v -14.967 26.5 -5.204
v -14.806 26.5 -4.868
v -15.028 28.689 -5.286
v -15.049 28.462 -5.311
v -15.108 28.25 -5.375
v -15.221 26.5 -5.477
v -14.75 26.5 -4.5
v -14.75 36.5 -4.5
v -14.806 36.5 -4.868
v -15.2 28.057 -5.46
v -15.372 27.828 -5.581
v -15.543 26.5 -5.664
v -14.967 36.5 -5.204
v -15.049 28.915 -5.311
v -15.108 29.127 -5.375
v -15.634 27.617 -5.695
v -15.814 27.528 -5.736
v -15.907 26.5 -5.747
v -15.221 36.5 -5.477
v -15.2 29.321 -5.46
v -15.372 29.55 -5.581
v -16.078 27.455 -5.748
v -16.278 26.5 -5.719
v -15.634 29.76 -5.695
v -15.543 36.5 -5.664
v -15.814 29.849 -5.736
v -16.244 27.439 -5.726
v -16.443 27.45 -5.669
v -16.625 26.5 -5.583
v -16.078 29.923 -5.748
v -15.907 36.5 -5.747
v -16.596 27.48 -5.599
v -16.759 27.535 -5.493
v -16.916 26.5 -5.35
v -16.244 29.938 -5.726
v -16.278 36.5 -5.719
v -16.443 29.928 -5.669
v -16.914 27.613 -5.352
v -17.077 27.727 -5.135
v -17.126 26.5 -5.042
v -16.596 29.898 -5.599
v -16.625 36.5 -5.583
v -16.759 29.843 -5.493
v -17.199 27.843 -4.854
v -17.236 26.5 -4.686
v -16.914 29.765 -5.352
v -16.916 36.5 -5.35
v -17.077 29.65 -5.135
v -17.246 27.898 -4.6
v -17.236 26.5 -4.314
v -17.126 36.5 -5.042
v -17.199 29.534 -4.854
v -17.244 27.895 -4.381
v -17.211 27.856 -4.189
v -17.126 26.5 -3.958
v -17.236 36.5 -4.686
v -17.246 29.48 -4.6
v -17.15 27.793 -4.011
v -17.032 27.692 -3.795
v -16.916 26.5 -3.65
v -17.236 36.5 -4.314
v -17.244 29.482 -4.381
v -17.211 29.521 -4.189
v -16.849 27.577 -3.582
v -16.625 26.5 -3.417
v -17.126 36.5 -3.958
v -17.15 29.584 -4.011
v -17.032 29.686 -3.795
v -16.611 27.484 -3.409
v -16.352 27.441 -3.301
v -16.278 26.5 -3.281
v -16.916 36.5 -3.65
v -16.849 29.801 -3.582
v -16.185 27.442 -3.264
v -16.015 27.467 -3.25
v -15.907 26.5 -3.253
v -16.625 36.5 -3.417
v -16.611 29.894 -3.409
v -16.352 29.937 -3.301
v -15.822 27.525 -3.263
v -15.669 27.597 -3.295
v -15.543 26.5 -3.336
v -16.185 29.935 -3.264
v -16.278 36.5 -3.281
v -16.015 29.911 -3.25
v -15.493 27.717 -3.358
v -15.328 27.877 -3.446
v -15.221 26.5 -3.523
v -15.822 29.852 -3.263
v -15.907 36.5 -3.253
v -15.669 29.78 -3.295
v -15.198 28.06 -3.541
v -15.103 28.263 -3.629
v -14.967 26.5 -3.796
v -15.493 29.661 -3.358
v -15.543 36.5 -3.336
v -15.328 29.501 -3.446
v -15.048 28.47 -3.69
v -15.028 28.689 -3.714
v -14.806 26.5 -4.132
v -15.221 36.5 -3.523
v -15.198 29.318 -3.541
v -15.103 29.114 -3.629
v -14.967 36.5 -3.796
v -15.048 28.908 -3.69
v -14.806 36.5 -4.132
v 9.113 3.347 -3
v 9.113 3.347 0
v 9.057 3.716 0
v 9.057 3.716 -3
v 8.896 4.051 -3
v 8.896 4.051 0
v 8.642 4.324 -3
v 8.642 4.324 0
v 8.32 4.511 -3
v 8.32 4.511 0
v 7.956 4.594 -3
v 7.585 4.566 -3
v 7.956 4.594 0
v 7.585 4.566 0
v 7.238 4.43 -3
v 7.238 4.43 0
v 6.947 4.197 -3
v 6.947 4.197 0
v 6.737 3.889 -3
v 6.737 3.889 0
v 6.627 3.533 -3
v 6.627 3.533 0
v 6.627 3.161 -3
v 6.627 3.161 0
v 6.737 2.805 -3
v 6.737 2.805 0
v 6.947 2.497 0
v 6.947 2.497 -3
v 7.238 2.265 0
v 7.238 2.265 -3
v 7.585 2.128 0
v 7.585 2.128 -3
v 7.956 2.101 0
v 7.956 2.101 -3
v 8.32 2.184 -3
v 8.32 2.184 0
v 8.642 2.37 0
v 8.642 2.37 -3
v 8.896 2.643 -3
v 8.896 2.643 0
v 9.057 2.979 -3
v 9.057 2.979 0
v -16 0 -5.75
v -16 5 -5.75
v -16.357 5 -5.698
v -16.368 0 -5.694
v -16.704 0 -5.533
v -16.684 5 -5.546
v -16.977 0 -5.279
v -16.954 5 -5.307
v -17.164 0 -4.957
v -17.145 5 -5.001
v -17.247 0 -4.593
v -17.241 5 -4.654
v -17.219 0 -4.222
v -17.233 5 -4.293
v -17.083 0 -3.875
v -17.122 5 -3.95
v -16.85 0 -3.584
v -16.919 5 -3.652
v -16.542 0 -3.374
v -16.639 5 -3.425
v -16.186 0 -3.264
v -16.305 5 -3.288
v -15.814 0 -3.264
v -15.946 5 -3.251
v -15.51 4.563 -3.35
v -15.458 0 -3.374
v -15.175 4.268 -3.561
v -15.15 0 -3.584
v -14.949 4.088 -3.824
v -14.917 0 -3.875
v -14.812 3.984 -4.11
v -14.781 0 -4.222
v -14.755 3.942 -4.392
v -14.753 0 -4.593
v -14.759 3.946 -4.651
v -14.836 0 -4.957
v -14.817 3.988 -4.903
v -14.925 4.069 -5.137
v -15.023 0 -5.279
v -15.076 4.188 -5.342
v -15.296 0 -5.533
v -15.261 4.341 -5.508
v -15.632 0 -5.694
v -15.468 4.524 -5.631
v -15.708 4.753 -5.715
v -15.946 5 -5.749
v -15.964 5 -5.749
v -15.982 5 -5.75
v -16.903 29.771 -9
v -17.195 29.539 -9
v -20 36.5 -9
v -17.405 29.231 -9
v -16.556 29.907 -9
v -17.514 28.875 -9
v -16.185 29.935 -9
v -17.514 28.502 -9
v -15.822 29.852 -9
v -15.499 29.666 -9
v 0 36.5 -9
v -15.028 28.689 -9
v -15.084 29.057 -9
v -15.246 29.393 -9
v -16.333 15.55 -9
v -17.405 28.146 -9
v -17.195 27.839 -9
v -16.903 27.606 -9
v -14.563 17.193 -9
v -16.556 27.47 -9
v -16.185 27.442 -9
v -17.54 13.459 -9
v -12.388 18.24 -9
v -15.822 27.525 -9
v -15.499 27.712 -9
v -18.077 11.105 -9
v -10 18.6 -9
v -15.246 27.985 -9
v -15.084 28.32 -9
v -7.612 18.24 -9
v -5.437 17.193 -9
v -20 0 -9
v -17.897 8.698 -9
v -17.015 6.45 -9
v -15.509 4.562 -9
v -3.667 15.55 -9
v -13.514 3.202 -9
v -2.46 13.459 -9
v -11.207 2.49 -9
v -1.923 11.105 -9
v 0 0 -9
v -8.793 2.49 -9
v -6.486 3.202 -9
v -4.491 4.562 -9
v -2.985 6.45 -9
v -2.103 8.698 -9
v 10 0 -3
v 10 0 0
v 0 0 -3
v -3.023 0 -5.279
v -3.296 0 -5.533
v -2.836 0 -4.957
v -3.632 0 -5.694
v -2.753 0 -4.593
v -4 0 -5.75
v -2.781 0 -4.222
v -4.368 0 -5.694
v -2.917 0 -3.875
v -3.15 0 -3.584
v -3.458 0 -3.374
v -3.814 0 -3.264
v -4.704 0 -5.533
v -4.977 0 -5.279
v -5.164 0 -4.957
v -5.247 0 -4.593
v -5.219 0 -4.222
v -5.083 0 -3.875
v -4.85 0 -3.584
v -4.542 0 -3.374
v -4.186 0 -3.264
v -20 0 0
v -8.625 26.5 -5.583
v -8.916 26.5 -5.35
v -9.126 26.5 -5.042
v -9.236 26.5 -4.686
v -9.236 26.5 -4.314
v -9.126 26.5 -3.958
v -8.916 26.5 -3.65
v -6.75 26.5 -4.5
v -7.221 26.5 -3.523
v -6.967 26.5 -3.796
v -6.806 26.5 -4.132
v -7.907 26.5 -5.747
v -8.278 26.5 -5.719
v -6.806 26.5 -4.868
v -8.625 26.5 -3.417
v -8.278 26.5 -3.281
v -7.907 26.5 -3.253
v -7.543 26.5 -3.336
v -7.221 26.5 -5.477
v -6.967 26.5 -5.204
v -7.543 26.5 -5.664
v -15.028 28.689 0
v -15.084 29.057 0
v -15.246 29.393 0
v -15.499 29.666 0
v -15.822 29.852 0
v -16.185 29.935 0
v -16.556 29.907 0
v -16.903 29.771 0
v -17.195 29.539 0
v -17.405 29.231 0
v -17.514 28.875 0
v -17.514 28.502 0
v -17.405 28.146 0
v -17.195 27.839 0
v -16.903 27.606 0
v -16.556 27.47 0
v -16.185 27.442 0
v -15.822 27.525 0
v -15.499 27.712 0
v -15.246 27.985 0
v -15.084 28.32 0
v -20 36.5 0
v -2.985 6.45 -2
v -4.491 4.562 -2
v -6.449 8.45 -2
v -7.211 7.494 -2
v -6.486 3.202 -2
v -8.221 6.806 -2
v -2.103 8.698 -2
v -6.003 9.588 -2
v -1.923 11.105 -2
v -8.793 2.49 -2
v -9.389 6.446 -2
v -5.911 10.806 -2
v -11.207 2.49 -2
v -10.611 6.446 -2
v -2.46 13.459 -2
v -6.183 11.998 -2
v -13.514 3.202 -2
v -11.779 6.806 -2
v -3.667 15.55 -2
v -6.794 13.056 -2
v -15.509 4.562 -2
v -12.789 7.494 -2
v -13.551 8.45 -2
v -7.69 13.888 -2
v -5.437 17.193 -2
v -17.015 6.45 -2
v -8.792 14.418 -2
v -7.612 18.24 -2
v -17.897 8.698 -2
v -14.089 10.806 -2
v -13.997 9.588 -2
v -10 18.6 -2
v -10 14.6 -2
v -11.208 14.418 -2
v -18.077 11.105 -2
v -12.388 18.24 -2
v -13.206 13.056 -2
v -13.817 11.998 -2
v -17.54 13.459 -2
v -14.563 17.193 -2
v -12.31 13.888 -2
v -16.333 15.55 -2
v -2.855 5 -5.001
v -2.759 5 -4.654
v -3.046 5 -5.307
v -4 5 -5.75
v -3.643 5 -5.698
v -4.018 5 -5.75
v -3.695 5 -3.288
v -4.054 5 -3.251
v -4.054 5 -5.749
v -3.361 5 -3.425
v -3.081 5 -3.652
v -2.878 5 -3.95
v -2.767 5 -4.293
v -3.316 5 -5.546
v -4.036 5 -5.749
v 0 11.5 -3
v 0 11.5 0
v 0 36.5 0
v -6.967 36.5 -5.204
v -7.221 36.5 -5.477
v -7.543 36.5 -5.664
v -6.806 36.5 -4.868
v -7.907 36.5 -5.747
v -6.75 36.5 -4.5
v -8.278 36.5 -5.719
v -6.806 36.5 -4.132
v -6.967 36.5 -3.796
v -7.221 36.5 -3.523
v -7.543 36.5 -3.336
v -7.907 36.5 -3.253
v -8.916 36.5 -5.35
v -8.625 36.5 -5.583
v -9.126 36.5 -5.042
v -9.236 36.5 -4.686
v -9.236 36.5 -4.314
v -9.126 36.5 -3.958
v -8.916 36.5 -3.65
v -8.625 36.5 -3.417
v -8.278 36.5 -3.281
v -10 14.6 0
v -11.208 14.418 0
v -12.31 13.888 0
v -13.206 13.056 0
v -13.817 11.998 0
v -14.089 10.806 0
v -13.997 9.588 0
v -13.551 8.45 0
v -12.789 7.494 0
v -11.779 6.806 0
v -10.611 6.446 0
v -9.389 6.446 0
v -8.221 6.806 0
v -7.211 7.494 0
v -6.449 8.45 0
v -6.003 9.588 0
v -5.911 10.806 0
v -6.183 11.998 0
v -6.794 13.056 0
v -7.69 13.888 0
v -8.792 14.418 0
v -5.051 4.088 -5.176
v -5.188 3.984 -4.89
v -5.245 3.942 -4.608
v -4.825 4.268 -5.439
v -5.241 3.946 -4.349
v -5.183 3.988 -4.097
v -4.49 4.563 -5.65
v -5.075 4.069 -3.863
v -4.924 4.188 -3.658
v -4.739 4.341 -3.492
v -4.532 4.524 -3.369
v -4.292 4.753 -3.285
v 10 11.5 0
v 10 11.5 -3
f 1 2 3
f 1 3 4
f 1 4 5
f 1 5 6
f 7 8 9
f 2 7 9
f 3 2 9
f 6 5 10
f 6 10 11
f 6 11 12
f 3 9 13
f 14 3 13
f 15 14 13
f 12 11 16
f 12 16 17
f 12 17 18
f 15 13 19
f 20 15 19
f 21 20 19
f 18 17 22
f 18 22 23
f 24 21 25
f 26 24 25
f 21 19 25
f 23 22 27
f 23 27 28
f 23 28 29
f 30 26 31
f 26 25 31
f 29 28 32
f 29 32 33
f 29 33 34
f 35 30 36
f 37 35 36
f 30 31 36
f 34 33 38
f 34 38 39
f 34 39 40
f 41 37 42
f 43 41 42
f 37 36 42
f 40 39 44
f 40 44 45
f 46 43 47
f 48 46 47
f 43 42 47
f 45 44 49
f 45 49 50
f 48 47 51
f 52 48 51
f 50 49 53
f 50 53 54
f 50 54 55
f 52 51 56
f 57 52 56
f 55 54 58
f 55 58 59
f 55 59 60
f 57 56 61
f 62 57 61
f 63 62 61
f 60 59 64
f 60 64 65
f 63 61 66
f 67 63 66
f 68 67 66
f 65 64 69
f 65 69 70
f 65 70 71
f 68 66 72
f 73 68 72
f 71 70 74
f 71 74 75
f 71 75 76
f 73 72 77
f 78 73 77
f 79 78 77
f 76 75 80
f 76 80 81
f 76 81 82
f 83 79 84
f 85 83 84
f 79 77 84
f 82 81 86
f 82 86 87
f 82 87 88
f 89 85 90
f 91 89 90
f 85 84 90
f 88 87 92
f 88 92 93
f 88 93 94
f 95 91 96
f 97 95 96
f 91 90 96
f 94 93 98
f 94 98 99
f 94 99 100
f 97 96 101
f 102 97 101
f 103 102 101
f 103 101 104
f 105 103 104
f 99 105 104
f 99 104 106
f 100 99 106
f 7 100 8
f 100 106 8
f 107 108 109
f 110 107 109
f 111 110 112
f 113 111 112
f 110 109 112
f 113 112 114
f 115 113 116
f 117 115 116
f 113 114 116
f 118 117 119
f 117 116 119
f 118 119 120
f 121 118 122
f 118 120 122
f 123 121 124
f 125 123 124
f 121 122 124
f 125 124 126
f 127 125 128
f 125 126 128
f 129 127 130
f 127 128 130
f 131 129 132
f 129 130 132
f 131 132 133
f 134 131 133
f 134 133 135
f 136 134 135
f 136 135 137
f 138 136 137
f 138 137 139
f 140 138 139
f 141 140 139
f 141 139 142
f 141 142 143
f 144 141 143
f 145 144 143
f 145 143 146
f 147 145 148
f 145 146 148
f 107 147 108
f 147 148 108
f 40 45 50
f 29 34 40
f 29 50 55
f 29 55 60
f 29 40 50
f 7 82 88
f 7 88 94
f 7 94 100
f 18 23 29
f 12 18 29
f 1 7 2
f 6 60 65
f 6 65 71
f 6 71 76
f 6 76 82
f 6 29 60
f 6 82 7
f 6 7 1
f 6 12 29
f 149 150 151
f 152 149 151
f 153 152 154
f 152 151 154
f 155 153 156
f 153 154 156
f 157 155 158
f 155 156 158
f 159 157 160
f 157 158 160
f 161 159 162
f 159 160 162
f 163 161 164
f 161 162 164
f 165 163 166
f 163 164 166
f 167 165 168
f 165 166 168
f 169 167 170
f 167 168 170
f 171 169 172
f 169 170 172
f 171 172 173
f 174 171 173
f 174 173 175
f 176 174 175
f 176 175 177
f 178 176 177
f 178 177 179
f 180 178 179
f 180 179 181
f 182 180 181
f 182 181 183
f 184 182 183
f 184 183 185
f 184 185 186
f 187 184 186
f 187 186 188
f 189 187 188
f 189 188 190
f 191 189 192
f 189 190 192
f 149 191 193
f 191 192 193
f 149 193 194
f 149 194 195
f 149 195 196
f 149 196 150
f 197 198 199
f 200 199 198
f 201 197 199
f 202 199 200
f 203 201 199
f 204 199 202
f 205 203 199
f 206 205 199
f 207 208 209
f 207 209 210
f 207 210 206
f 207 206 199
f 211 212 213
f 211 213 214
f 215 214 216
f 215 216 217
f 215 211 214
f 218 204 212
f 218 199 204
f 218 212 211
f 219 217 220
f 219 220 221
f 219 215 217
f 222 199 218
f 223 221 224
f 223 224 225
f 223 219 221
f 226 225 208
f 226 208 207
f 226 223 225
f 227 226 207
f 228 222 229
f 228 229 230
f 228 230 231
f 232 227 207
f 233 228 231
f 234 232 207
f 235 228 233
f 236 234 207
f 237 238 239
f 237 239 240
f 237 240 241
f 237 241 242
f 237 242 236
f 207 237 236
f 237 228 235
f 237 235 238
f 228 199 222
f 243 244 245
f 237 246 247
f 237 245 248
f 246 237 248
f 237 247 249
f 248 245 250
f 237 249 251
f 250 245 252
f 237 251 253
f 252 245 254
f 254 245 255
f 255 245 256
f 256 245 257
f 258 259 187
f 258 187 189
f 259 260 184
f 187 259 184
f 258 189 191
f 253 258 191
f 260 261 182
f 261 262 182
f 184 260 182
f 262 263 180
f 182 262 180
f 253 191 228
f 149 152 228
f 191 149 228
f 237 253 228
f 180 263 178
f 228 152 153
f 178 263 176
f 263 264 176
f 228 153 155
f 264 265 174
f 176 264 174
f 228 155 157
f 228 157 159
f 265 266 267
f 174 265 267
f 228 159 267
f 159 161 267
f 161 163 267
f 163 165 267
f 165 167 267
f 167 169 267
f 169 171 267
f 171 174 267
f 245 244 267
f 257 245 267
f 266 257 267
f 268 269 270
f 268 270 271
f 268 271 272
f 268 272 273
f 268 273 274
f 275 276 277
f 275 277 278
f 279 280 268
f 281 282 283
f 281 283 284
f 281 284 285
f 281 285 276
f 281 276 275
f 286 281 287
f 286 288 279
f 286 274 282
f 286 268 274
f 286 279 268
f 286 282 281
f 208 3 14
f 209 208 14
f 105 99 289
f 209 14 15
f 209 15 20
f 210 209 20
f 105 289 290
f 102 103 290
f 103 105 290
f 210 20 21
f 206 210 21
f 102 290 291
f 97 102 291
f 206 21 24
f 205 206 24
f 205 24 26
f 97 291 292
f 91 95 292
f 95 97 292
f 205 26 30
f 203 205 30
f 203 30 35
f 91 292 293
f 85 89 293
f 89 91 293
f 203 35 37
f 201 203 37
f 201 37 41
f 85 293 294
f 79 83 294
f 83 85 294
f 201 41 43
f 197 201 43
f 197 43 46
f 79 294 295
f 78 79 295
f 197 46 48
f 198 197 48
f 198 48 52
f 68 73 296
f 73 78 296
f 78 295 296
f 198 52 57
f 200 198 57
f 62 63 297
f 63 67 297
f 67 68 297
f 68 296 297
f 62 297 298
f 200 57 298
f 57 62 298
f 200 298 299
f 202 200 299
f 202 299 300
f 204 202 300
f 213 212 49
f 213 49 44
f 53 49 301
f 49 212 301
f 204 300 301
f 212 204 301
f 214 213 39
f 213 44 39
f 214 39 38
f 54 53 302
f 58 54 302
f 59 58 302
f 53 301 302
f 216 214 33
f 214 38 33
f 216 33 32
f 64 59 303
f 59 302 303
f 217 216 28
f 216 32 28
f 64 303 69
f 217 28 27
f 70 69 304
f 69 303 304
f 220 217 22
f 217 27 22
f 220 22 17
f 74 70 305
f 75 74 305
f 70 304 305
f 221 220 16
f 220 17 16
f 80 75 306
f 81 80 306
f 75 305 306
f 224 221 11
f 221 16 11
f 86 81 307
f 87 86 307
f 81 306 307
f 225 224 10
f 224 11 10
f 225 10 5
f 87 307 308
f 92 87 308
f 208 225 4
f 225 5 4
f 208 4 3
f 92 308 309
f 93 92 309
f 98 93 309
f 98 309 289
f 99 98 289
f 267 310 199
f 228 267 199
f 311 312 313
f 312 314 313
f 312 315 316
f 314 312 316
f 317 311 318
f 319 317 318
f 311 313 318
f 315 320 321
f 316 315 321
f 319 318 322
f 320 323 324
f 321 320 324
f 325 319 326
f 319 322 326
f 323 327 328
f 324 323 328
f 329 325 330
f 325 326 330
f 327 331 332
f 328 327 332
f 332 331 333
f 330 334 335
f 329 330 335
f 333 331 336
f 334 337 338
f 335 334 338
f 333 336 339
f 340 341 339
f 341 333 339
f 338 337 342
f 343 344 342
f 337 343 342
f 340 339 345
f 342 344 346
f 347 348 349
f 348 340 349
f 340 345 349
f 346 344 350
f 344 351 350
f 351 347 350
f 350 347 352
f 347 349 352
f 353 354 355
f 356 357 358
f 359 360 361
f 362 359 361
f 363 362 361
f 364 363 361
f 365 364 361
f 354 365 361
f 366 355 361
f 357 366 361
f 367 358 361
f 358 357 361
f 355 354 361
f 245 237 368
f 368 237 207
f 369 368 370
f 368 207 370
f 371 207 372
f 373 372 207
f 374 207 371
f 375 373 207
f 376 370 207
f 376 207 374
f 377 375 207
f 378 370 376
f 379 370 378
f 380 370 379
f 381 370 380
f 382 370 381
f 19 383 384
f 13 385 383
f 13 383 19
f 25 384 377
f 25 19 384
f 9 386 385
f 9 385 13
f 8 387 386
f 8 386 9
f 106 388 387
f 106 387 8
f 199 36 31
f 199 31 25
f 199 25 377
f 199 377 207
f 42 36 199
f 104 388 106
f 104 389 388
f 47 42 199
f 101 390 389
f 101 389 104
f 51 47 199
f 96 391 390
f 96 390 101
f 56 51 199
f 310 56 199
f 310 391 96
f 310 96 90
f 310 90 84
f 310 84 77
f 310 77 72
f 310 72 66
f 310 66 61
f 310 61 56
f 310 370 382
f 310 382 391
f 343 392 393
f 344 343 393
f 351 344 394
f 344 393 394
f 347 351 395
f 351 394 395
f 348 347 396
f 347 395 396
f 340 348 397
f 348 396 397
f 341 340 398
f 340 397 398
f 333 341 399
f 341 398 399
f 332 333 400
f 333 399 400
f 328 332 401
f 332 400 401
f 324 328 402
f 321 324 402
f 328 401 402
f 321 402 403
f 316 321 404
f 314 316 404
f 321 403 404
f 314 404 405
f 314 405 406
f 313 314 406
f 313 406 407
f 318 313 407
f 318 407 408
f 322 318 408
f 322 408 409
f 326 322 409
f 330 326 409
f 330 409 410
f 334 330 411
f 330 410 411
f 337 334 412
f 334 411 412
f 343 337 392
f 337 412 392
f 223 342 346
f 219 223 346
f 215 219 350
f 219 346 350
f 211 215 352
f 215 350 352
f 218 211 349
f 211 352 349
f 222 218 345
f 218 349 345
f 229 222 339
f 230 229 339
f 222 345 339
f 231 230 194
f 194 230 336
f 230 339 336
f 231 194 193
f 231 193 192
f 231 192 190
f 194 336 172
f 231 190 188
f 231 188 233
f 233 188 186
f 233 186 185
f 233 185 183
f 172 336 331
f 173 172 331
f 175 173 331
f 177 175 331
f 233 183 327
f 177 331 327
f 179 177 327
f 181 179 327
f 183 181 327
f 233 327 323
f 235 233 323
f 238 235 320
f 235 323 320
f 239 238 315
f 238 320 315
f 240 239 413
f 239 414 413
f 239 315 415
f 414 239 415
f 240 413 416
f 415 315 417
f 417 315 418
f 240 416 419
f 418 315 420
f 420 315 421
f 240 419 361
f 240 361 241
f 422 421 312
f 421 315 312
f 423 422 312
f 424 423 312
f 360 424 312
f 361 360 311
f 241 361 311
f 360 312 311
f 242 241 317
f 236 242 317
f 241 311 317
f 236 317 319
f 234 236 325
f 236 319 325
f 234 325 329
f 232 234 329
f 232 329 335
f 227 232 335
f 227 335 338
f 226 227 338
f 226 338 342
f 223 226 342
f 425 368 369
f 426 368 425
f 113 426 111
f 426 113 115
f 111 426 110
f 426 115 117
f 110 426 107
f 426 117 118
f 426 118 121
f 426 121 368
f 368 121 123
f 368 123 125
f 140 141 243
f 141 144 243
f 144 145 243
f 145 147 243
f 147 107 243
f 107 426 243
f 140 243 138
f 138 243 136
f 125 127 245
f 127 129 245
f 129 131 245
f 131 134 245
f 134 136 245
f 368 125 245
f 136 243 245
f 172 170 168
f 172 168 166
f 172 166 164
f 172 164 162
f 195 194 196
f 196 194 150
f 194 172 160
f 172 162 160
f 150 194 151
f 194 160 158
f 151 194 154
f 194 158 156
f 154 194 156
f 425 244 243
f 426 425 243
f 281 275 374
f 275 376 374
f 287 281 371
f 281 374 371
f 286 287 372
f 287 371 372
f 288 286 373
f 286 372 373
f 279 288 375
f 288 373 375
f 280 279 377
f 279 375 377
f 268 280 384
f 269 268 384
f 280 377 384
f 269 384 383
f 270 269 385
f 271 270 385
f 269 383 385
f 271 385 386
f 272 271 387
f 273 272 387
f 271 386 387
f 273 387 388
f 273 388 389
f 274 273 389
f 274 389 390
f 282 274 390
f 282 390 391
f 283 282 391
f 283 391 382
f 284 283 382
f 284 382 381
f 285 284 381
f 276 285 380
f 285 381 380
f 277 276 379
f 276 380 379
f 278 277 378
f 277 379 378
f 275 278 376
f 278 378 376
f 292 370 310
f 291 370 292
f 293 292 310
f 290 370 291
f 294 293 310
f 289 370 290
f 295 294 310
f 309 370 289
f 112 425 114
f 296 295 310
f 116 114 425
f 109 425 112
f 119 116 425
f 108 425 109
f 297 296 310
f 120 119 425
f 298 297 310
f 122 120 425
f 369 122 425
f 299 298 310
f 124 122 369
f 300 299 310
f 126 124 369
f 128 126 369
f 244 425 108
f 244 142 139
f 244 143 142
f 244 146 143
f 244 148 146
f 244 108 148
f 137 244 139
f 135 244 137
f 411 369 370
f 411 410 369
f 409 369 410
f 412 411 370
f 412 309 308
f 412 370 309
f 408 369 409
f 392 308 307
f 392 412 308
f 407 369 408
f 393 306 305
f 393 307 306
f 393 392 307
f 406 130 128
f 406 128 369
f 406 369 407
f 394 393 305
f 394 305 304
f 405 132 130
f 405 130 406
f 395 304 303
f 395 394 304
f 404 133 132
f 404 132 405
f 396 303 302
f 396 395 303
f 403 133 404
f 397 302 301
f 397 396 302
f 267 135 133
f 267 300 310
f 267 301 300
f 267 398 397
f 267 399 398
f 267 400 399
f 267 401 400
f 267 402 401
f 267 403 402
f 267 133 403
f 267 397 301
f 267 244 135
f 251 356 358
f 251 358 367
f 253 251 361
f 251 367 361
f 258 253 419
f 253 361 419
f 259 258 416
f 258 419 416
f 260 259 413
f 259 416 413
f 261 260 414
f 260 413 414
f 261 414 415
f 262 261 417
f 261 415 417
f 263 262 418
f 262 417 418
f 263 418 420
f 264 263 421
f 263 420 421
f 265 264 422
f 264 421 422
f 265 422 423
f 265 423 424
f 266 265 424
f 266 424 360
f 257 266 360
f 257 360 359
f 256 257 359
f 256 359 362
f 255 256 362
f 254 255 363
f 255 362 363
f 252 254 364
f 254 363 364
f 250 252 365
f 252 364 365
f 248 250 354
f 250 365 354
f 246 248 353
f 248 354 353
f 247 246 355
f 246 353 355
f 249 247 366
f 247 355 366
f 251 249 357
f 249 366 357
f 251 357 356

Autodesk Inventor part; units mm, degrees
ref_plane "YZ Plane" through (0, 0, 0) normal (1, 0, 0) x (0, 1, 0)
ref_plane "XZ Plane" through (0, 0, 0) normal (0, 1, 0) x (-1, 0, 0)
ref_plane "Plano de trabajo1" through (-47.2143, 36.5, -75.5) normal (0, -1, 0) x (1, 0, 0)
sketch "Boceto1" plane through (0, 0, 0) normal (0, 1, 0) x (-1, 0, 0)
  line L0 (0, 0) -> (20, 0)
  line L1 (20, 0) -> (20, -9)
  line L2 (20, -9) -> (0, -9)
  line L3 (0, -9) -> (0, 0)
  line L4 (0, 0) -> (-10, 0)
  line L5 (-10, 0) -> (-10, -3)
  line L6 (-10, -3) -> (0, -3)
  line L7 (0, -3) -> (0, 0)
  dimension "d0" = 20
  dimension "d1" = 9
  dimension "d25" = 10
  dimension "d26" = 3
extrude "Extrusión1" add sketch "Boceto1" along normal up to surface (36.5 mm away)
sketch "Boceto2" plane through (0, 0, -9) normal (0, 0, -1) x (-1, 0, 0)
  circle A0 centre (10, 10.5) radius 4.5 projected
  point P0 (0, 0)
hole "Agujero1" at (-10, 10.5, -9) direction (0, 0, 1) diameter 16.2 depth 7
sketch "Boceto3" plane through (0, 0, -9) normal (0, 0, -1) x (-1, 0, 0)
  circle A0 centre (10, 10.5) radius 8.1 projected
  point P0 (0, 0)
hole "Agujero2" at (-10, 10.5, -9) direction (0, 0, 1) diameter 8.2 end through all
sketch "Boceto4" plane through (0, 0, 0) normal (0, -1, 0) x (1, 0, 0)
  circle A0 centre (-4, -4.5) radius 1.25 projected
  circle A1 centre (-16, -4.5) radius 1.25 projected
  point P0 (0, 0)
hole "Agujero3" at (-16, 0, -4.5) at (-4, 0, -4.5) direction (0, 1, 0) diameter 2.5 depth 5
sketch "Boceto6" plane through (-20, 36.5, 0) normal (0, 1, 0) x (1, 0, 0)
  line L0 (30, 0) -> (30, 3) projected
  line L1 (30, 3) -> (20, 3)
  line L2 (20, 3) -> (20, 0)
  line L3 (20, 0) -> (30, 0)
  line L4 (30, 0) -> (30, 3)
extrude "Extrusión2" cut sketch "Boceto6" against normal blind 25
sketch "Boceto7" plane through (-20, 0, 0) normal (0, 0, 1) x (1, 0, 0)
  circle A0 centre (3.7217, 28.6888) radius 2.1 projected
  circle A1 centre (27.863, 3.3471) radius 2.1 projected
  circle A2 centre (3.7217, 28.6888) radius 1.25
  circle A3 centre (27.863, 3.3471) radius 1.25
  point P0 (20, 0)
  dimension "d31" = 2.5
  dimension "d32" = 2.5
extrude "Extrusión3" cut sketch "Boceto7" against normal through all contours A2 | A3
sketch "Boceto8" plane through (-20, 36.5, -9) normal (0, 1, 0) x (1, 0, 0)
  line L0 (0, 0) -> (0, -9) projected
  line L1 (0, -4.5) -> (4, -4.5)
  line L2 (4, -4.5) -> (12, -4.5)
  circle A0 centre (4, -4.5) radius 1.25
  circle A1 centre (12, -4.5) radius 1.25
  point P0 (20, -9)
  dimension "d33" = 4
  dimension "d34" = 8
  dimension "d35" = 2.5
extrude "Extrusión4" cut sketch "Boceto8" against normal blind 10
properties part number "Soporte mecanismo 2"
